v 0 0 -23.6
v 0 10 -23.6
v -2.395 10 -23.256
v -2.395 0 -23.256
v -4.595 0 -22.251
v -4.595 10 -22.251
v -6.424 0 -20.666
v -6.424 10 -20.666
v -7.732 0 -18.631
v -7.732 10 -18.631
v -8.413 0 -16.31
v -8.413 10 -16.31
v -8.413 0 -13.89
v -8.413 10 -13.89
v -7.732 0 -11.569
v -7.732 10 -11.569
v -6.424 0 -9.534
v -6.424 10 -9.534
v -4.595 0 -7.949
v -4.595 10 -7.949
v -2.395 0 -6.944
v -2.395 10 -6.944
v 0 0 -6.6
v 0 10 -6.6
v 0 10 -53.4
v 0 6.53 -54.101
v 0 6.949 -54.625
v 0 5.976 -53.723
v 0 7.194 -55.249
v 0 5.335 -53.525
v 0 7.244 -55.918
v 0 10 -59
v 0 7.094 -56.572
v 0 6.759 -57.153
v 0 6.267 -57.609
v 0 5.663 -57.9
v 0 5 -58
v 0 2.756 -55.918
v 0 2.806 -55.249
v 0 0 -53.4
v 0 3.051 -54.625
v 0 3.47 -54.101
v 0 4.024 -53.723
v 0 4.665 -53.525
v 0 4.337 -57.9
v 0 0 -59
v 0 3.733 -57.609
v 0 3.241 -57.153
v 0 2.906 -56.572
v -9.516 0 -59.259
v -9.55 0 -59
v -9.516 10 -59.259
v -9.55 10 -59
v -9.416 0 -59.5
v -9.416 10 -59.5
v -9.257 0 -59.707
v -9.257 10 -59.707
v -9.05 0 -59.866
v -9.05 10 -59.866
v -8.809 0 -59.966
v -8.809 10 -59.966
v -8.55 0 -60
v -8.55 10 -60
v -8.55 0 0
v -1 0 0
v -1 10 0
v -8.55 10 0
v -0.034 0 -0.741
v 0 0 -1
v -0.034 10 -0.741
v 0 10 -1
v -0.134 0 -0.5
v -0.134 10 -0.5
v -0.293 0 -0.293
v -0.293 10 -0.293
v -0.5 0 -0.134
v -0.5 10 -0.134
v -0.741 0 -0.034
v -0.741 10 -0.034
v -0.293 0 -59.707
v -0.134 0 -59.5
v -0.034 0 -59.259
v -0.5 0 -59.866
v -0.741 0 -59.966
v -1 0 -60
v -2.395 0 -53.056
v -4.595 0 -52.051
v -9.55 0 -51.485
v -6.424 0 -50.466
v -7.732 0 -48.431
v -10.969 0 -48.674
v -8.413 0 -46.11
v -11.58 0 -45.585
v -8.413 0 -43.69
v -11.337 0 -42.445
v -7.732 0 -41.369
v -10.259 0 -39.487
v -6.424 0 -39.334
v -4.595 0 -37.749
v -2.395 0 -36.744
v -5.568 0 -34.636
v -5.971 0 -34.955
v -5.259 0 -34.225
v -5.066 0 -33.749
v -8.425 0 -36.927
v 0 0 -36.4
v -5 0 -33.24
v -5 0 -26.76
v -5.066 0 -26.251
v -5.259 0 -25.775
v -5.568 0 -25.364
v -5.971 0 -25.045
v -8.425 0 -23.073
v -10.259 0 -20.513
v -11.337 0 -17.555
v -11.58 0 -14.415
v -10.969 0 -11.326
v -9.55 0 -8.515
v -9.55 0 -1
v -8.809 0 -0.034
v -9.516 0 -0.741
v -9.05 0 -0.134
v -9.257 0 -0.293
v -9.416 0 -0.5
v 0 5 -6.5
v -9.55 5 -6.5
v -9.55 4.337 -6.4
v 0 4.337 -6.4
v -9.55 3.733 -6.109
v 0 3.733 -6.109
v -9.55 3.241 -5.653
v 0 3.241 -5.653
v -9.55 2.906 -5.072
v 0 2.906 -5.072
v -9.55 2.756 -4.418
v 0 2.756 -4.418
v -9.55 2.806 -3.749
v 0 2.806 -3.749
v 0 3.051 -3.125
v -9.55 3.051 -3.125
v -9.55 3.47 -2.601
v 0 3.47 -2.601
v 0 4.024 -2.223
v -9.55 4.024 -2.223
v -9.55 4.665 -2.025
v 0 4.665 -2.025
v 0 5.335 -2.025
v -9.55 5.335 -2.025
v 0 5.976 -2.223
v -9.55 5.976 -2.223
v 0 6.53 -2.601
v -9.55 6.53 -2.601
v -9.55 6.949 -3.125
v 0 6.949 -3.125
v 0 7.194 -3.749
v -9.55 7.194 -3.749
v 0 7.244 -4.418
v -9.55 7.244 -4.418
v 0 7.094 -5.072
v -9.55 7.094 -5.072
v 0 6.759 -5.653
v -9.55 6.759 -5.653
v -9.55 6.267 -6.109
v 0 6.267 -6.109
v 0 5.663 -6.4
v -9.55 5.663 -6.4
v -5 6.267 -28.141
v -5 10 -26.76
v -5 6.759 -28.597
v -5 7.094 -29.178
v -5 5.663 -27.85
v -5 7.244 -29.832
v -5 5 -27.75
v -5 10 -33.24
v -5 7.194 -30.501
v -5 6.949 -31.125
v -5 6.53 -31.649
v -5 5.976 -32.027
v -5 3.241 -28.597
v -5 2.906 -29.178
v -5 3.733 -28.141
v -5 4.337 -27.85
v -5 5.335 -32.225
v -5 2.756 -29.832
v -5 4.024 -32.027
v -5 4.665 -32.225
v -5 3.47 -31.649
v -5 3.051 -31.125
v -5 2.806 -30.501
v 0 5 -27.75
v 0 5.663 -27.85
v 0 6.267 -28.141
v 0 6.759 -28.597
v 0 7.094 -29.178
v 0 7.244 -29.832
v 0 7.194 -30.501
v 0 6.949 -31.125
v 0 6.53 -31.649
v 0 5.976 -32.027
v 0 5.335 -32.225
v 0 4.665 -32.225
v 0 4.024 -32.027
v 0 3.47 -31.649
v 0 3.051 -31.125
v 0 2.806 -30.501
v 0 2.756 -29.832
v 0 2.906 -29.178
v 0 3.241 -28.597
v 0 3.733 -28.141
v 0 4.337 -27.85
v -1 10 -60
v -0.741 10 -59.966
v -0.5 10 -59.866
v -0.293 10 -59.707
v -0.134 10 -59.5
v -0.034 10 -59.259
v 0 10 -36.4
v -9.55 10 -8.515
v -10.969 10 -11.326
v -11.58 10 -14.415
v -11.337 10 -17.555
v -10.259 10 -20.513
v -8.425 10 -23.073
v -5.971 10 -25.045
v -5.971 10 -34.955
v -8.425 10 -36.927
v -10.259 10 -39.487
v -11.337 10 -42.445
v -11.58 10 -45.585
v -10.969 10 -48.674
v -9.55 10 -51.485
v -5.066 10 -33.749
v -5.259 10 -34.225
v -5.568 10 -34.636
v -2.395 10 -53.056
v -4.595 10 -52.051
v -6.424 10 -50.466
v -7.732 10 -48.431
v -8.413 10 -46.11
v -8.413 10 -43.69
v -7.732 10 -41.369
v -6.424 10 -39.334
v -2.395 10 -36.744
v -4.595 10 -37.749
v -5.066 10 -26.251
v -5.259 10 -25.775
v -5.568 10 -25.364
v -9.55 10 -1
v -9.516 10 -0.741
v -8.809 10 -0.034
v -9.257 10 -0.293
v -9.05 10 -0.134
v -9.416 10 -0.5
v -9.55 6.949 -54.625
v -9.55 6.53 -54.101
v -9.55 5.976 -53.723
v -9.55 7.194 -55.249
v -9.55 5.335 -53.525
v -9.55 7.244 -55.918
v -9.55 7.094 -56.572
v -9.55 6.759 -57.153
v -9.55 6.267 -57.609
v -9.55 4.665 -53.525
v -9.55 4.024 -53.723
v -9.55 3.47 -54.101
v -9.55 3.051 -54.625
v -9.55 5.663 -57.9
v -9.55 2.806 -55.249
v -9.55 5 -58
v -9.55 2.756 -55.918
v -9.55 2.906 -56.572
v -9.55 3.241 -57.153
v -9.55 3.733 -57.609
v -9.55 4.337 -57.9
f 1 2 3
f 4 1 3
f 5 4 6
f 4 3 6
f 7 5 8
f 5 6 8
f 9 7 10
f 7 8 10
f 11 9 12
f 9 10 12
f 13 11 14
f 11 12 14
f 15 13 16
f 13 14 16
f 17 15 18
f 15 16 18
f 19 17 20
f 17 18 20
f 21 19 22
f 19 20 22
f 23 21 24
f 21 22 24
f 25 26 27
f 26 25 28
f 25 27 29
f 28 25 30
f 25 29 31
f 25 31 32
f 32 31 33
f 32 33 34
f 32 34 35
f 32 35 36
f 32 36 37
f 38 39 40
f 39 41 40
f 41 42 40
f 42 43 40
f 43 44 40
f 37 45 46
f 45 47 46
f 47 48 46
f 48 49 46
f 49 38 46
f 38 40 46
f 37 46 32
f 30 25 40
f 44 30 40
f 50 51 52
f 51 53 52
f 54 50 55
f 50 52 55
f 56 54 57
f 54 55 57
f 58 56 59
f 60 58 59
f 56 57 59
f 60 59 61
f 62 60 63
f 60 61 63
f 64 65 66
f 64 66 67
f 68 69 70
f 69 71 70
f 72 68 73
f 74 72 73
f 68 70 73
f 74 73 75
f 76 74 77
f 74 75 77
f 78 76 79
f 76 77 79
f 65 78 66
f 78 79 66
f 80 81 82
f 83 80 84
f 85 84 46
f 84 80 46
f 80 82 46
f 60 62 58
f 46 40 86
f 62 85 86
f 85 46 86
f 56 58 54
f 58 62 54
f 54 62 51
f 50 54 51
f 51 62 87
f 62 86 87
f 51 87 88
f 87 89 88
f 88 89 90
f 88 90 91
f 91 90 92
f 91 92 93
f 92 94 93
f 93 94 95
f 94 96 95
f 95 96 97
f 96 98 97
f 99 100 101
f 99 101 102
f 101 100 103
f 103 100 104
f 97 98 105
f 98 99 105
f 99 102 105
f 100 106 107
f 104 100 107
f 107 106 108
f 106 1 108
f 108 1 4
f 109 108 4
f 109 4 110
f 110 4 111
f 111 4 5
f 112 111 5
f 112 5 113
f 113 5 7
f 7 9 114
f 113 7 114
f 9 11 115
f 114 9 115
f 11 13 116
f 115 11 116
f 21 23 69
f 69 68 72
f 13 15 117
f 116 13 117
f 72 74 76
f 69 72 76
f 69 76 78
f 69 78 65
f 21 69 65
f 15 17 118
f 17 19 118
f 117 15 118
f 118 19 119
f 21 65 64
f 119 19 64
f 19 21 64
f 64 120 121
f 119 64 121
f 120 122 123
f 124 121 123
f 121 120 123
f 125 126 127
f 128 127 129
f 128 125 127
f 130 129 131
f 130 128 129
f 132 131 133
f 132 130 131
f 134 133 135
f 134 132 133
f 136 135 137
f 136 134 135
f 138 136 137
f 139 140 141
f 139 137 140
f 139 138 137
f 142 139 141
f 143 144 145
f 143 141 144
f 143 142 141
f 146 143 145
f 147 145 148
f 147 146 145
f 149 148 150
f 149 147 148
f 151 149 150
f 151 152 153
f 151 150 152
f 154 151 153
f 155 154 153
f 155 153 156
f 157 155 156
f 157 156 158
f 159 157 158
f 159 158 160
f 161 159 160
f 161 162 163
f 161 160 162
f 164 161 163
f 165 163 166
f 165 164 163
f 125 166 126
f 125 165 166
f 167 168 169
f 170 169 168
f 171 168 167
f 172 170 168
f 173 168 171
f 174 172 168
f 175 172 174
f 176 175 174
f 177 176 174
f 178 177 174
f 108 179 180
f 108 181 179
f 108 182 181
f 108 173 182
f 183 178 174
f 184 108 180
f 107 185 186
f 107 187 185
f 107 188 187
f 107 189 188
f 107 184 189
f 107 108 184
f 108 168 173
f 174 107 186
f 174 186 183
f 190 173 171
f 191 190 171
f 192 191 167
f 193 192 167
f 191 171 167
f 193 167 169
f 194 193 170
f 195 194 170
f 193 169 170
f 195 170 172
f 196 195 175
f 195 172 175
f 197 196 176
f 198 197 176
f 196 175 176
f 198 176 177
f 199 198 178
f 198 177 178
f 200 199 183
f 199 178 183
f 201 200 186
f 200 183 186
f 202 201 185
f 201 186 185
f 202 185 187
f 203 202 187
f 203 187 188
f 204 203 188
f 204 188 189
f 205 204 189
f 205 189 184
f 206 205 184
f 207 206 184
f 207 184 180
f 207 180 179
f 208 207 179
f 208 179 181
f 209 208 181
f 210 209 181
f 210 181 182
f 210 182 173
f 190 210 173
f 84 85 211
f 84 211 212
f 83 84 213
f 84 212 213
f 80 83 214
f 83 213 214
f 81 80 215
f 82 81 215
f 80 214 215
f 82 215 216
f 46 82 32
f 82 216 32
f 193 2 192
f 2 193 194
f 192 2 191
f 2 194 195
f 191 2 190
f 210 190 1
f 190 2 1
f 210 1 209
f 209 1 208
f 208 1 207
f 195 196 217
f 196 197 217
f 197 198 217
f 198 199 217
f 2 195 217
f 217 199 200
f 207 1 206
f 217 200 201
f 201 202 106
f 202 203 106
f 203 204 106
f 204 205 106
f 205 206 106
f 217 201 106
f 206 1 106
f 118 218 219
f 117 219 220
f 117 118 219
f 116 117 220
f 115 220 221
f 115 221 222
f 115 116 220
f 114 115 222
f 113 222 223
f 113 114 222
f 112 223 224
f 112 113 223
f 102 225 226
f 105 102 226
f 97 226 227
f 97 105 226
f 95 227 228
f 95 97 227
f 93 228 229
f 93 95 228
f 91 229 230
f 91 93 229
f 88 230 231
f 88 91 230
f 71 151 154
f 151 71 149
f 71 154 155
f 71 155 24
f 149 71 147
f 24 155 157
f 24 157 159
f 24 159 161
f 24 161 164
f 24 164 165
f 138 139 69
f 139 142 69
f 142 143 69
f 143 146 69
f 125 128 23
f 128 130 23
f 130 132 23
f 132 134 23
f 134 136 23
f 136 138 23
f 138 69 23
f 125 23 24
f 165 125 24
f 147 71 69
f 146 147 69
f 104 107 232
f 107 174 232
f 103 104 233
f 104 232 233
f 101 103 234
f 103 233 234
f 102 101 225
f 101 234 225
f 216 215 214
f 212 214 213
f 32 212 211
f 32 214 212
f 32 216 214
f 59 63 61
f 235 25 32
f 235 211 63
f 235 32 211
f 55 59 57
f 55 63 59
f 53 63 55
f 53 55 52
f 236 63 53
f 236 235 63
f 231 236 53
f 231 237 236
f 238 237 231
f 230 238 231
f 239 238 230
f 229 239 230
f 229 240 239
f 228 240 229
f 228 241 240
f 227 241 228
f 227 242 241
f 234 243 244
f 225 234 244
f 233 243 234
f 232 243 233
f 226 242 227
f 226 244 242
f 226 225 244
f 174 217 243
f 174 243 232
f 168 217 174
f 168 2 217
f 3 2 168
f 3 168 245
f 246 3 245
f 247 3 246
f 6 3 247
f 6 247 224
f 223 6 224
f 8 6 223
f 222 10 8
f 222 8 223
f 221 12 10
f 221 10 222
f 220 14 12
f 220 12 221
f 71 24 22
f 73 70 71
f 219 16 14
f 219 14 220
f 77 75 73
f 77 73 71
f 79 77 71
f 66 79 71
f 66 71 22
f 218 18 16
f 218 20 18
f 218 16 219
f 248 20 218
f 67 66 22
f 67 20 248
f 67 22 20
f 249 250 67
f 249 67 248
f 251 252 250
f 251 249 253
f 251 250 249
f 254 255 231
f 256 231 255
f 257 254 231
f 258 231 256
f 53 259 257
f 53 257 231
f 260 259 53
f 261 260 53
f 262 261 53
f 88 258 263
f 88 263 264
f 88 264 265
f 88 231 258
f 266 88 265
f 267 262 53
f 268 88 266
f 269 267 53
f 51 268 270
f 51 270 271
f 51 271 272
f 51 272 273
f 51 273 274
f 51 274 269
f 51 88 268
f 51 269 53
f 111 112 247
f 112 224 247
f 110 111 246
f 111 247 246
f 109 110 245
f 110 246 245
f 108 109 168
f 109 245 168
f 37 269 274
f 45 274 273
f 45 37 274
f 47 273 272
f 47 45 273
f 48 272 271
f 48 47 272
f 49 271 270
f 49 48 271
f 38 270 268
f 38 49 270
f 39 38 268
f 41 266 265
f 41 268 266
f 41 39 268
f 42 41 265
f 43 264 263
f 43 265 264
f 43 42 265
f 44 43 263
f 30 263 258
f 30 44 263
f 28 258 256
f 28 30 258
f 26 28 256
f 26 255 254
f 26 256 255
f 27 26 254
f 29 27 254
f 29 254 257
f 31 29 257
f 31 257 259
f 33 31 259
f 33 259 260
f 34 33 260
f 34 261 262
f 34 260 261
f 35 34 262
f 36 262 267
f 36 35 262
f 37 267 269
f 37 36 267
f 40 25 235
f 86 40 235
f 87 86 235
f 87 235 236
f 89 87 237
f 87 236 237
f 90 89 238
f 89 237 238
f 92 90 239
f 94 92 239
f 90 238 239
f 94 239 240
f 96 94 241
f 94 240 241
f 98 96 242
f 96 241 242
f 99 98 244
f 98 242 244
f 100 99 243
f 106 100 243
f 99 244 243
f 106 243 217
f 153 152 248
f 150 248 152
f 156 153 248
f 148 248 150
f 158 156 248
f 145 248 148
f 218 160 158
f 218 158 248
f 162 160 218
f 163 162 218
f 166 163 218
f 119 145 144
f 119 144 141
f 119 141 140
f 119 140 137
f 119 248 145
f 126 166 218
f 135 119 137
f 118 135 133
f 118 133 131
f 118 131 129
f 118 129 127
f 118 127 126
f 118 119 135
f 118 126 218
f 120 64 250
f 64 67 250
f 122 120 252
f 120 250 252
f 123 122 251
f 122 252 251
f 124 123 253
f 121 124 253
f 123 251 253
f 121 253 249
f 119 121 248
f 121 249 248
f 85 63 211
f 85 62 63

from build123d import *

# Parameters (mm, degrees)
EXTRUDE_1_DEPTH     = 10
EXTRUDE_START       = -10
EXTRUDE_2_DEPTH     = 10
EXTRUDE_4_DEPTH     = 10
SKETCH_3_R          = 2.25
CUT_EXTRUDE_4_DEPTH = 62.923824171
SKETCH_4_R          = 2.25
CUT_EXTRUDE_2_DEPTH = 62.184638595
FILLET_2_R          = 1
EXTRUDE_3_DEPTH     = 10
CUT_EXTRUDE_3_DEPTH = 62.923824171
FILLET_3_R          = 1
FILLET_4_R          = 2


with BuildPart() as part:
    # Эскиз1 → Бобышка-Вытянуть1 (new body)
    with BuildSketch(Plane(origin=(0, 0, 0), x_dir=(1, 0, 0), z_dir=(0, 1, 0))):
        with BuildLine():
            Line((0, 0), (0, 8))
            ThreePointArc((0, 8), (-7.1, 15.1), (0, 22.2))
            Line((0, 22.2), (0, 37.8))
            ThreePointArc((0, 37.8), (-7.1, 44.9), (0, 52))
            Line((0, 52), (0, 60))
            Line((0, 60), (-3, 60))
            Line((-3, 60), (-3, 54.544169223))
            ThreePointArc((-3, 54.544169223), (-10.1, 44.9), (-3, 35.255830777))
            Line((-3, 35.255830777), (-3, 24.744169223))
            ThreePointArc((-3, 24.744169223), (-10.1, 15.1), (-3, 5.455830777))
            Line((-3, 5.455830777), (-3, 0))
            Line((-3, 0), (0, 0))
        make_face()
    extrude(amount=EXTRUDE_1_DEPTH)

    # Эскиз2 → Бобышка-Вытянуть2 (add)
    with BuildSketch(Plane(origin=(0, 10, 0), x_dir=(1, 0, 0), z_dir=(0, 1, 0)).offset(EXTRUDE_START)):
        with BuildLine():
            Line((-3, 60), (-8.049844719, 60))
            Line((-8.049844719, 60), (-8.049844719, 51))
            ThreePointArc((-8.049844719, 51), (-5.802159163, 53.167100402), (-3, 54.544169223))
            Line((-3, 54.544169223), (-3, 60))
        make_face()
        with BuildLine():
            Line((-3, 0), (-3, 5.455830777))
            ThreePointArc((-3, 5.455830777), (-5.802159163, 6.832899598), (-8.049844719, 9))
            Line((-8.049844719, 9), (-8.049844719, 0))
            Line((-8.049844719, 0), (-3, 0))
        make_face()
    extrude(amount=EXTRUDE_2_DEPTH)

    # Эскиз9 → Бобышка-Вытянуть4 (add, through all)
    with BuildSketch(Plane.XZ):
        with BuildLine():
            Line((-5, -25.567091287), (-5, -34.432908713))
            ThreePointArc((-5, -34.432908713), (-11.207890559, -41.909483454), (-9.549844719, -51.484866426))
            Line((-9.549844719, -51.484866426), (-9.549844719, -60))
            Line((-9.549844719, -60), (-8.049844719, -60))
            Line((-8.049844719, -60), (-8.049844719, -51))
            ThreePointArc((-8.049844719, -51), (-9.617405222, -41.81527687), (-3, -35.255830777))
            Line((-3, -35.255830777), (-3, -24.744169223))
            ThreePointArc((-3, -24.744169223), (-9.617405222, -18.18472313), (-8.049844719, -9))
            Line((-8.049844719, -9), (-8.049844719, 0))
            Line((-8.049844719, 0), (-9.549844719, 0))
            Line((-9.549844719, 0), (-9.549844719, -8.515133574))
            ThreePointArc((-9.549844719, -8.515133574), (-11.207890559, -18.090516546), (-5, -25.567091287))
        make_face()
    extrude(amount=-EXTRUDE_4_DEPTH)

    # Эскиз3 → Вырез-Вытянуть4 (cut, through all)
    with BuildSketch(Plane.ZY):
        with Locations(Location((-55.75, 5, 0), (0, 0, 180))):
            Circle(SKETCH_3_R)
        with Locations(Location((-4.25, 5, 0), (0, 0, 180))):
            Circle(SKETCH_3_R)
    extrude(amount=CUT_EXTRUDE_4_DEPTH, mode=Mode.SUBTRACT)

    # Эскиз4 → Вырез-Вытянуть2 (cut, through all)
    with BuildSketch(Plane.ZY.offset(5)):
        with Locations((-30, 5)):
            Circle(SKETCH_4_R)
    extrude(amount=-CUT_EXTRUDE_2_DEPTH, mode=Mode.SUBTRACT)

    # Скругление2
    fillet_2_edges = [part.edges().sort_by_distance(p)[0] for p in [
        (0, 5, -60),
        (0, 5, 0),
    ]]
    fillet(fillet_2_edges, radius=FILLET_2_R)

    # Эскиз5 → Бобышка-Вытянуть3 (add, through all)
    with BuildSketch(Plane.XZ):
        with BuildLine():
            Line((0, -8), (0, -8.1))
            ThreePointArc((0, -8.1), (-7, -15.1), (0, -22.1))
            Line((0, -22.1), (0, -22.2))
            ThreePointArc((0, -22.2), (-7.1, -15.1), (0, -8))
        make_face()
        with BuildLine():
            Line((0, -51.9), (0, -52))
            ThreePointArc((0, -52), (-7.1, -44.9), (0, -37.8))
            Line((0, -37.8), (0, -37.9))
            ThreePointArc((0, -37.9), (-7, -44.9), (0, -51.9))
        make_face()
    extrude(amount=-EXTRUDE_3_DEPTH)

    # Эскиз7 → Вырез-Вытянуть3 (cut, through all)
    with BuildSketch(Plane(origin=(0, 10, 0), x_dir=(1, 0, 0), z_dir=(0, 1, 0))):
        with BuildLine():
            Line((0, 51.9), (0, 53.4))
            ThreePointArc((0, 53.4), (-8.5, 44.9), (0, 36.4))
            Line((0, 36.4), (0, 37.9))
            ThreePointArc((0, 37.9), (-7, 44.9), (0, 51.9))
        make_face()
        with BuildLine():
            Line((0, 22.1), (0, 23.6))
            ThreePointArc((0, 23.6), (-8.5, 15.1), (0, 6.6))
            Line((0, 6.6), (0, 8.1))
            ThreePointArc((0, 8.1), (-7, 15.1), (0, 22.1))
        make_face()
    extrude(amount=-CUT_EXTRUDE_3_DEPTH, mode=Mode.SUBTRACT)

    # Скругление3
    fillet_3_edges = [part.edges().sort_by_distance(p)[0] for p in [
        (-9.549844719, 5, 0),
        (-9.549844719, 5, -60),
    ]]
    fillet(fillet_3_edges, radius=FILLET_3_R)

    # Скругление4
    fillet_4_edges = [part.edges().sort_by_distance(p)[0] for p in [
        (-5, 5, -34.432908713),
        (-5, 5, -25.567091287),
    ]]
    fillet(fillet_4_edges, radius=FILLET_4_R)


solid = part.part
